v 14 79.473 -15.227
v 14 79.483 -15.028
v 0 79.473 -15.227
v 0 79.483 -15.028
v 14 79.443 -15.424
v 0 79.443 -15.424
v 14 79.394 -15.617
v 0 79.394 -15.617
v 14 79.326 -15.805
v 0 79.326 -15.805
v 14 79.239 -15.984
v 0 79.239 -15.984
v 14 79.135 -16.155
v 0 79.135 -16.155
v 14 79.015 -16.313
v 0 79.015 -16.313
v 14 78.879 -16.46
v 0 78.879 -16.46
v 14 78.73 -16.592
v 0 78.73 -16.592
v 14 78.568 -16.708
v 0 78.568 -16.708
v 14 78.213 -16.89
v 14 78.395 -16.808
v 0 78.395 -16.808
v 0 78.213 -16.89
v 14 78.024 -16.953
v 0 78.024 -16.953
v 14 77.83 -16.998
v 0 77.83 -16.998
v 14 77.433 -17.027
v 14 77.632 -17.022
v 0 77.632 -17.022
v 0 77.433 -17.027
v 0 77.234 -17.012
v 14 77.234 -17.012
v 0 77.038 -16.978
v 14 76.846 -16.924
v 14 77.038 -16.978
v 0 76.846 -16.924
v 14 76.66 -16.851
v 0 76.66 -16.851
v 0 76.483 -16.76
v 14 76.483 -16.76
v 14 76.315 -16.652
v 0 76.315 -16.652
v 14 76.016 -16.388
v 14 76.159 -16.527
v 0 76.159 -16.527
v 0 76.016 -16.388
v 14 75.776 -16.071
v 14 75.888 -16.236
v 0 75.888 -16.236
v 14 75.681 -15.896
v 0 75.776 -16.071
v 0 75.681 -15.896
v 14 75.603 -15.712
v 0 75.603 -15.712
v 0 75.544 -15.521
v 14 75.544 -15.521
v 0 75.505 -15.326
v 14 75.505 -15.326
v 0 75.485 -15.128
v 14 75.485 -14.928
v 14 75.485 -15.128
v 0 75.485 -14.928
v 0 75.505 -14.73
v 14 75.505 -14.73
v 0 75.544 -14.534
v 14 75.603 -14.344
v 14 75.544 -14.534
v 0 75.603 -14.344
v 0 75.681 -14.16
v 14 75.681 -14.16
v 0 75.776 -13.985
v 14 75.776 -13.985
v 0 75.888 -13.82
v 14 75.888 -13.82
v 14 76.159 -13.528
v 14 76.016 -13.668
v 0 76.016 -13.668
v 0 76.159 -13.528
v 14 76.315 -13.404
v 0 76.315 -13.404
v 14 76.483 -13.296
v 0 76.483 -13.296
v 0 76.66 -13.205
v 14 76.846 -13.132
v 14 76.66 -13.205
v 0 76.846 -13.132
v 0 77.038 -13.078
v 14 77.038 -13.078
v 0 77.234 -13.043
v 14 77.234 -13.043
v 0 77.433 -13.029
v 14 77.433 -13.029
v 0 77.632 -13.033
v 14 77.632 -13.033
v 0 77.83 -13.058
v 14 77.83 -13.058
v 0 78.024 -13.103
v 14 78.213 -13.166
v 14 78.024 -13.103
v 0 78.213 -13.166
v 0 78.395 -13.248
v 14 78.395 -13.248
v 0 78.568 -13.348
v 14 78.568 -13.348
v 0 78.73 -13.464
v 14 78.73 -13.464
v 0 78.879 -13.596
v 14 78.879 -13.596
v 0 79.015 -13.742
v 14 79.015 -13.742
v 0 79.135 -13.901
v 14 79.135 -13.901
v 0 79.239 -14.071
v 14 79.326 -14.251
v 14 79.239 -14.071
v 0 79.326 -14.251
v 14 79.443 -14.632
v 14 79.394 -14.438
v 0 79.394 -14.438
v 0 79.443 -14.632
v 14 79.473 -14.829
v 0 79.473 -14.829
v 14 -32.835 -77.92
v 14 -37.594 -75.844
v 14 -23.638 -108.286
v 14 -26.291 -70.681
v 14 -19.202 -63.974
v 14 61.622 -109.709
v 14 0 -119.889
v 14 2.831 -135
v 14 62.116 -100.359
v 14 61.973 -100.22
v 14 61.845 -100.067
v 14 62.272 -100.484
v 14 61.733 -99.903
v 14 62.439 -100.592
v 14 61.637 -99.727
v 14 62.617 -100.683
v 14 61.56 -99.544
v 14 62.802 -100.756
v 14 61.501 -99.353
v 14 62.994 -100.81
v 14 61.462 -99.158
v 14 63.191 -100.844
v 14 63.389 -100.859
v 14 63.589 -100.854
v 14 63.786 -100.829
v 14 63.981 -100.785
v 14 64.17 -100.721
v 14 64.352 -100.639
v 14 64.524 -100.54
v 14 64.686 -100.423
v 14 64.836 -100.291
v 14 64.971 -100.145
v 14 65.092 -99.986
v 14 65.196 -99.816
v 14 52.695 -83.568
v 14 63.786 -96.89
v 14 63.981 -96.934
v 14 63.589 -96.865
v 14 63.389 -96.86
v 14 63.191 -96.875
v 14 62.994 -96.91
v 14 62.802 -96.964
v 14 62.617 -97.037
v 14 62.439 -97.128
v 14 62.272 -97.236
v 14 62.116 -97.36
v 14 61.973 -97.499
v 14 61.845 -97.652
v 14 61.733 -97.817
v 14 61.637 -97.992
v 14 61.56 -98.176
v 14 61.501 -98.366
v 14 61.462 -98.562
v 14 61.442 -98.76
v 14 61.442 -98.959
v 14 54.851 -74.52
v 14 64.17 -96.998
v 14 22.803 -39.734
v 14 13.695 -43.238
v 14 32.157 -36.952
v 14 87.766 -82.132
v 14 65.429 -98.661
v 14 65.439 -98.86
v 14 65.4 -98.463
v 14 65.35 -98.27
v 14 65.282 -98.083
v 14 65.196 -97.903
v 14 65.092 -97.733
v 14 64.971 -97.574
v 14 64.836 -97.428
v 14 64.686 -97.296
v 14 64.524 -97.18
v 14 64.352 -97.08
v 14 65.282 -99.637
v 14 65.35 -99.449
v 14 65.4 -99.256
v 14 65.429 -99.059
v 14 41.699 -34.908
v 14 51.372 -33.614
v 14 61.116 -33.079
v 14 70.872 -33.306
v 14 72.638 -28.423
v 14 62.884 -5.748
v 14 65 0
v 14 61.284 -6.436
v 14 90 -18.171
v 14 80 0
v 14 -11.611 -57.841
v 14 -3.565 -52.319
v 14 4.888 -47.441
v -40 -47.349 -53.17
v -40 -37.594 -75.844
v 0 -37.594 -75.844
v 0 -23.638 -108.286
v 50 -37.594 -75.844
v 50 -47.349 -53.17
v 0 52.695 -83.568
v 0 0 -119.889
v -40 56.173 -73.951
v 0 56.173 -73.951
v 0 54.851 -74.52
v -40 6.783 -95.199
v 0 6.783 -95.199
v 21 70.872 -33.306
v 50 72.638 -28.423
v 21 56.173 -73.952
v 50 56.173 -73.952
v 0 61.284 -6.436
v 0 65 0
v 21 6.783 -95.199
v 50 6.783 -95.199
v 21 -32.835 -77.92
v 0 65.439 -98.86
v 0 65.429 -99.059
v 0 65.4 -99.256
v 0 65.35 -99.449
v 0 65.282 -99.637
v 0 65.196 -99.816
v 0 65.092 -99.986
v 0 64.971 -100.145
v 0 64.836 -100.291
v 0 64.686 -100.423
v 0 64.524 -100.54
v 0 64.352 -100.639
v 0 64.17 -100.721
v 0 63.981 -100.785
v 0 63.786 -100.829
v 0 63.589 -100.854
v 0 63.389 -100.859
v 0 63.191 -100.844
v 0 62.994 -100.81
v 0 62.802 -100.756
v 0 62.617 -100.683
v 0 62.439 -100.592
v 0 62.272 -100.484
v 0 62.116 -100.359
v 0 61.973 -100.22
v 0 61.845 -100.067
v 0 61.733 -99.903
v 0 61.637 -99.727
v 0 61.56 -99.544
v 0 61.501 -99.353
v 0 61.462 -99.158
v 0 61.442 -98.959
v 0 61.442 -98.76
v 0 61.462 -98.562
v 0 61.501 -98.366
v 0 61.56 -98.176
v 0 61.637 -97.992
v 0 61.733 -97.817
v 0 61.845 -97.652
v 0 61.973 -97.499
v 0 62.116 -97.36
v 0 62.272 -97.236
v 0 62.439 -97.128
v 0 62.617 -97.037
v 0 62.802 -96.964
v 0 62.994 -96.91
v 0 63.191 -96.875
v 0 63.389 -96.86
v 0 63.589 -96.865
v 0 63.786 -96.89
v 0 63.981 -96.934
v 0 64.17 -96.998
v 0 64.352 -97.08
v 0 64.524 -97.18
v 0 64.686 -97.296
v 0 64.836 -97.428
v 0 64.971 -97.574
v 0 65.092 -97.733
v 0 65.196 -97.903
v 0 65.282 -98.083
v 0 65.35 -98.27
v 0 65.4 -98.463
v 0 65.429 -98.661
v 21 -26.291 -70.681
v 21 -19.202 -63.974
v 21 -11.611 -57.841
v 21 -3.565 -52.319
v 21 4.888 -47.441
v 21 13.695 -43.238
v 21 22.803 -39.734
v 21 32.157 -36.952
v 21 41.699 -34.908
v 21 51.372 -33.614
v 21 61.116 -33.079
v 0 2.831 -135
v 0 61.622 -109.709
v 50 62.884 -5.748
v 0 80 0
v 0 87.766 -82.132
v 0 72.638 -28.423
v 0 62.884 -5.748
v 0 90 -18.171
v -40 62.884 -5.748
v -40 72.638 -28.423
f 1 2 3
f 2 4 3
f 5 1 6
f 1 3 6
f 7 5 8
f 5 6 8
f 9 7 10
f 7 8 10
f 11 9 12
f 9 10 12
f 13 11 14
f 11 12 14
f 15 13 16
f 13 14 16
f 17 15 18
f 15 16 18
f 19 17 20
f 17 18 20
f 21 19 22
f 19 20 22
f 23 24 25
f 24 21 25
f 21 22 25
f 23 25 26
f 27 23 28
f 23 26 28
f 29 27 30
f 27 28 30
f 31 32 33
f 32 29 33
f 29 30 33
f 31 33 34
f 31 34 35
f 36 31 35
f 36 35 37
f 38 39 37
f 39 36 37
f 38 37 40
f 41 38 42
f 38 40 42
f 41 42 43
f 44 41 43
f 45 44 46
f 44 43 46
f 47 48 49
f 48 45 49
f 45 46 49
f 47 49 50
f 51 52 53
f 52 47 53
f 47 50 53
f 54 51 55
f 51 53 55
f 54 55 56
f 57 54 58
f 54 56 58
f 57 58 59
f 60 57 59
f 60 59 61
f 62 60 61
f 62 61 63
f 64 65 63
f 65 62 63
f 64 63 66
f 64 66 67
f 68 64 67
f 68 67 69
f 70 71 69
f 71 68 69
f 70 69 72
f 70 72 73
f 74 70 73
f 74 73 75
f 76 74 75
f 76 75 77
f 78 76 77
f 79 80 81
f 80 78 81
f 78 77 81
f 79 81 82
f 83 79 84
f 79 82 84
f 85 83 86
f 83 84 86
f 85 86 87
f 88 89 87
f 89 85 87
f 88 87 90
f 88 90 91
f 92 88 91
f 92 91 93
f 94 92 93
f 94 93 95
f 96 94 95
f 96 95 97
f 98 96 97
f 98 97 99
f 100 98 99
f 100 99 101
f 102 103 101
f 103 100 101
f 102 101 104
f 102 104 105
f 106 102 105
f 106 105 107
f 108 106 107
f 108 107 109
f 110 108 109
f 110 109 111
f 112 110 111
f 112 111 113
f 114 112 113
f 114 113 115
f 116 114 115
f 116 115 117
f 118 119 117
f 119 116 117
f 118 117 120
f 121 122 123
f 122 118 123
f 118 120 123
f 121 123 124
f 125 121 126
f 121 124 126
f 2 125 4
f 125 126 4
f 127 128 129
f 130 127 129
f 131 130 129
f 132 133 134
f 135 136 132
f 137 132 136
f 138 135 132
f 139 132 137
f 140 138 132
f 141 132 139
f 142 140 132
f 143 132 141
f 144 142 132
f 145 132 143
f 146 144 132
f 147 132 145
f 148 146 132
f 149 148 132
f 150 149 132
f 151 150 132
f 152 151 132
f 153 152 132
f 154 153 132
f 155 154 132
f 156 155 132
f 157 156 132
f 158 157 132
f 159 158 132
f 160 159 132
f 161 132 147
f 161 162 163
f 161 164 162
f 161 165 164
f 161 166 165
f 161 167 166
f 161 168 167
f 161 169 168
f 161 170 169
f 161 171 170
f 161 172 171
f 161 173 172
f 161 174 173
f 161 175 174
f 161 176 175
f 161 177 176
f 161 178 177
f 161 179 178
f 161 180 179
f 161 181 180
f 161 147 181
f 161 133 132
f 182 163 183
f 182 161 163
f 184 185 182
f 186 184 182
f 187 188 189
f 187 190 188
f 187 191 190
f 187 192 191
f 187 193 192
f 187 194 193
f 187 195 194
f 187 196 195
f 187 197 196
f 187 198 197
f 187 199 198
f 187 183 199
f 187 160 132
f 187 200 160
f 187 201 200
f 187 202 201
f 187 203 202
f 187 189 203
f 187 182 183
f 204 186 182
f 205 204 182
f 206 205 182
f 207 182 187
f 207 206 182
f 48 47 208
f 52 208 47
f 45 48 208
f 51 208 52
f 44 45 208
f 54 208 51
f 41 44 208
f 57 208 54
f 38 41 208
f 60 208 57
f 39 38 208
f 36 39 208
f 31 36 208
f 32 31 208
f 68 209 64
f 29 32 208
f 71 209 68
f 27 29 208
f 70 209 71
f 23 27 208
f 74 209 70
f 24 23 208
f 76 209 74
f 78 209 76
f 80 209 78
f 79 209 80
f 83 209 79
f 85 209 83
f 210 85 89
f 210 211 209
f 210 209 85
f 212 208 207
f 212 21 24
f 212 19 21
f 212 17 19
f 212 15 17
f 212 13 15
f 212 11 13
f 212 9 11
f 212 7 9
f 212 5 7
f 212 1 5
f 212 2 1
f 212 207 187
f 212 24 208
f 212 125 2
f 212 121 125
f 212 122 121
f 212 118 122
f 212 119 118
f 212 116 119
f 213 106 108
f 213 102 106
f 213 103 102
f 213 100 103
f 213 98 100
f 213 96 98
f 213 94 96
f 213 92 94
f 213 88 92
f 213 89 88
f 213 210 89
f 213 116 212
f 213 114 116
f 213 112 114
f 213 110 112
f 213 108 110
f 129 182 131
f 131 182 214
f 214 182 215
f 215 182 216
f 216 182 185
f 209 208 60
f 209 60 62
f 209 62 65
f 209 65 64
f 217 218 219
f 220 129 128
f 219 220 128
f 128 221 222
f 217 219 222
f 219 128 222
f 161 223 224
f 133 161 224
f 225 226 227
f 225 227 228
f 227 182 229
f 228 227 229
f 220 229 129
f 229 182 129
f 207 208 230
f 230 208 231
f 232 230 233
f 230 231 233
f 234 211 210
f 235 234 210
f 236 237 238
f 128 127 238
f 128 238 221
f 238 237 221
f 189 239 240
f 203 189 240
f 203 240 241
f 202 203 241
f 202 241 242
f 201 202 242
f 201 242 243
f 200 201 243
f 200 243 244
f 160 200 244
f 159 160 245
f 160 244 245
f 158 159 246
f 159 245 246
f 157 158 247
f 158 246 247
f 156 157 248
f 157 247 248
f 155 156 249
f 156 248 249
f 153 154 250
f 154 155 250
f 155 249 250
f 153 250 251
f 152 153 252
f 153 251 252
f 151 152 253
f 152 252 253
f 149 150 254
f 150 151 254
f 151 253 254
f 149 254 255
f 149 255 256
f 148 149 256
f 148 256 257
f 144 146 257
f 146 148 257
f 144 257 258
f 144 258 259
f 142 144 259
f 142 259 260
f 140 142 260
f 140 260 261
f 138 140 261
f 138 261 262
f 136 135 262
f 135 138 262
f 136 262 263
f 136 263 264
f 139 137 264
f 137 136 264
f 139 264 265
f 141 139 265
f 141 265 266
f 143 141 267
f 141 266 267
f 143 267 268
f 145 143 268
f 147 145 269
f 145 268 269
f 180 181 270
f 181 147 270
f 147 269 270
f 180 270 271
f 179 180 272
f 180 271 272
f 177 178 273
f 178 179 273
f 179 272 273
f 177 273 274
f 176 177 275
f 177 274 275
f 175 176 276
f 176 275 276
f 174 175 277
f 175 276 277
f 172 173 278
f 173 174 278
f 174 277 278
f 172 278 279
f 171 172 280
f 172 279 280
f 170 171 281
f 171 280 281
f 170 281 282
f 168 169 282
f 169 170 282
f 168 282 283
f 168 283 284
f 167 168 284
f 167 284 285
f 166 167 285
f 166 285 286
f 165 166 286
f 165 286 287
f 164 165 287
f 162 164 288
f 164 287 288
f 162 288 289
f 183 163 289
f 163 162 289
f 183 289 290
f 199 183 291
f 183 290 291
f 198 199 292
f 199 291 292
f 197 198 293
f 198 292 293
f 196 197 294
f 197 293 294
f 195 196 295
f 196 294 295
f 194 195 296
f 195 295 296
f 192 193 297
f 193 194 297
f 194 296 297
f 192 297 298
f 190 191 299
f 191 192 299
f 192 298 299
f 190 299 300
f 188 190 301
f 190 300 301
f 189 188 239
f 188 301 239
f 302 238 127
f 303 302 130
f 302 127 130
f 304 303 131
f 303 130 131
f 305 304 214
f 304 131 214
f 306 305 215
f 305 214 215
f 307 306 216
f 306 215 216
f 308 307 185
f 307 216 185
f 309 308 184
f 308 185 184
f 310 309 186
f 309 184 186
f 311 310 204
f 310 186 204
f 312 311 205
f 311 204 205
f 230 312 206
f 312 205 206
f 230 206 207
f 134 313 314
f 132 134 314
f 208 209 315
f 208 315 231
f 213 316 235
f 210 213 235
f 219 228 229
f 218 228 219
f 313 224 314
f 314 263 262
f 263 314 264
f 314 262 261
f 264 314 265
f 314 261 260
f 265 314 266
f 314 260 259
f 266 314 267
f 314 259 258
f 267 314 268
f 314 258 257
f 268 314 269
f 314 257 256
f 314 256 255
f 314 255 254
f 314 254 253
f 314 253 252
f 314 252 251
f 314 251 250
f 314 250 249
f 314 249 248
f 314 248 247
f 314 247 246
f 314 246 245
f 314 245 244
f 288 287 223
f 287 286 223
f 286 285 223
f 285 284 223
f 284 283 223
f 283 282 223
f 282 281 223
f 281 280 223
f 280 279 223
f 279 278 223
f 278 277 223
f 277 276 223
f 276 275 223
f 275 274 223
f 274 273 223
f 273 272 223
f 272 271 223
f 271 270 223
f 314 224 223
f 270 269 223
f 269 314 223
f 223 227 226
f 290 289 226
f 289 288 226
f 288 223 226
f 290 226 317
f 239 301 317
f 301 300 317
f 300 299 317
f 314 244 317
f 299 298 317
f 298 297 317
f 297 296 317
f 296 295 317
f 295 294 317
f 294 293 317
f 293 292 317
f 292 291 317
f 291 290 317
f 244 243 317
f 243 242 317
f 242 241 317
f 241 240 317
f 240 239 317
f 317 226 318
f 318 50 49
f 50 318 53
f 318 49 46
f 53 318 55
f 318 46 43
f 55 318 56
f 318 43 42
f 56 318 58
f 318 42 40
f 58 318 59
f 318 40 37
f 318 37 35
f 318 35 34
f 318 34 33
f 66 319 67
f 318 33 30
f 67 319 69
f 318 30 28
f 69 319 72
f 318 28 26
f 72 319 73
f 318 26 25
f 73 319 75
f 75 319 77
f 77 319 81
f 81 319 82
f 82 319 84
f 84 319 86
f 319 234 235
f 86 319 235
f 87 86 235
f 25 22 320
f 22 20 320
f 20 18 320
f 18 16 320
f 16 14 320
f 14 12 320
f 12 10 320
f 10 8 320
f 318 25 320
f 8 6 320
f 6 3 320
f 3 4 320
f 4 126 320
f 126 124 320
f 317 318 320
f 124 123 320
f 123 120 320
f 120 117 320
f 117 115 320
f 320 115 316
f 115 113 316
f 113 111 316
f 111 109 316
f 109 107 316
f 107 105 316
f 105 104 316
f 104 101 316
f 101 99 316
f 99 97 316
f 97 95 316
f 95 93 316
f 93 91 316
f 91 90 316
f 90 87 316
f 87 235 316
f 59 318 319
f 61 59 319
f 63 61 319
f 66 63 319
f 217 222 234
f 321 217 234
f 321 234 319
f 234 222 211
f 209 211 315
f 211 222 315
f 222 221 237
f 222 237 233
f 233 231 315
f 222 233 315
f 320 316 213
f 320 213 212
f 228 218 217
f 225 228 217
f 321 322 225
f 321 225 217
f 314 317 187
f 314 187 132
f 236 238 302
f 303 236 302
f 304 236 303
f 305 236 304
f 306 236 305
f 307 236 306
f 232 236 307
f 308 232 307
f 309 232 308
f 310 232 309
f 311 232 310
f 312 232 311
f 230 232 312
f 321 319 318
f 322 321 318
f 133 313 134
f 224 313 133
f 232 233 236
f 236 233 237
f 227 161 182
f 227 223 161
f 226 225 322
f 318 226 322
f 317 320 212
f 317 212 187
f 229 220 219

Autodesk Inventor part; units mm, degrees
ref_plane "YZ Plane" through (0, 0, 0) normal (1, 0, 0) x (0, 1, 0)
ref_plane "XZ Plane" through (0, 0, 0) normal (0, 1, 0) x (-1, 0, 0)
ref_plane "XY Plane" through (0, 0, 0) normal (0, 0, 1) x (1, 0, 0)
sketch "Sketch1" plane through (0, 0, 0) normal (1, 0, 0) x (0, 1, 0)
  line L0 (90, 0) -> (0, 0) construction
  line L1 (0, 0) -> (0, -135) construction
  line L2 (0, -135) -> (90, -135) construction
  line L3 (90, -135) -> (90, 0) construction
  line L4 (80, 0) -> (65, 0)
  line L5 (80, 0) -> (90, -18.1711)
  line L6 (90, -18.1711) -> (87.7664, -82.1322)
  line L7 (87.7664, -82.1322) -> (61.6218, -109.7086)
  line L8 (2.8311, -135) -> (0, -119.8888)
  line L9 (52.695, -83.5675) -> (60.7393, -49.8037)
  line L10 (60.7393, -49.8037) -> (55.0089, -17.3051)
  line L11 (55.0089, -17.3051) -> (65, 0)
  line L12 (55.0089, -17.3051) -> (52.695, -83.5675) construction
  line L13 (52.695, -83.5675) -> (0, -119.8888)
  line L14 (2.8311, -135) -> (61.6218, -109.7086)
  line L15 (87.7664, -82.1322) -> (0, -119.8888) construction
  line L16 (80, 0) -> (61.6218, -109.7086) construction
  line L17 (0, 27) -> (0, -162) projected
  line L18 (-18, 0) -> (108, 0) projected
  circle A0 centre (77.4826, -15.0279) radius 2
  circle A1 centre (63.4392, -98.8597) radius 2
  line L19 (61.6218, -109.7086) -> (23.93, -103.3945) construction
  dimension "d10" = 135
  dimension "d11" = 90
  dimension "d29" = 10
  dimension "d30" = 15
  dimension "d31" = 2
  dimension "d34" = 120
  dimension "d37" = 64
  dimension "d39" = 35
  dimension "d40" = 140
  dimension "d42" = 38
  dimension "d43" = 15
  dimension "d44" = 64
  dimension "d45" = 64
  dimension "d46" = 33
  dimension "d47" = 34.7088
  dimension "d59" = 85
  dimension "d60" = 11
  dimension "d61" = 4
extrude "Extrusion1" add sketch "Sketch1" along normal blind 14 contours L5 L6 L7 L14 L8 L13 L9 L10 L11 L4
sketch "Sketch2" plane through (0, 0, 0) normal (-1, 0, 0) x (0, 0, 1)
  line L0 (-18.1711, 90) -> (0, 80) projected
  line L1 (-82.1322, 87.7664) -> (-18.1711, 90) projected
  line L2 (-109.7086, 61.6218) -> (-82.1322, 87.7664) projected
  line L3 (-135, 2.8311) -> (-109.7086, 61.6218) projected
  line L4 (-119.8888, 0) -> (-135, 2.8311) projected
  line L5 (-83.5675, 52.695) -> (-119.8888, 0) projected
  line L6 (-49.8037, 60.7393) -> (-83.5675, 52.695) projected
  line L7 (-17.3051, 55.0089) -> (-49.8037, 60.7393) projected
  line L8 (0, 65) -> (-17.3051, 55.0089) projected
  line L9 (0, 80) -> (0, 65) projected
  circle A0 centre (-98.8597, 63.4392) radius 2 projected
  circle A1 centre (-15.0279, 77.4826) radius 2 projected
  line L10 (-135, 2.8311) -> (-109.7086, 61.6218) projected
  line L11 (-18.1711, 90) -> (0, 80) projected
  line L12 (-5.748, 62.8835) -> (-60.8643, 86.5942)
  line L13 (-60.8643, 86.5942) -> (-108.2857, -23.6383)
  line L14 (-108.2857, -23.6383) -> (-53.1695, -47.349)
  line L15 (-53.1695, -47.349) -> (-5.748, 62.8835)
  line L16 (-18.1711, 90) -> (-27.3572, 93.9518)
  point P0 (-74.5203, 54.8505)
  point P1 (-6.436, 61.2841)
  dimension "d70" = 35
  dimension "d72" = 120
  dimension "d76" = 60
  dimension "d78" = 10
  dimension "d79" = 20
extrude "Extrusion2" add sketch "Sketch2" along normal blind 40 and the other way blind 50 contours L15 L14 L13 L6 L7 L8 | L8 L7 L6 L13 L12 L15
sketch "Sketch3" plane through (-40, 0, 0) normal (-1, 0, 0) x (0, 0, 1)
  circle A0 centre (-15.0279, 77.4826) radius 2 projected
  line L0 (-83.5675, 52.695) -> (-15.0279, 77.4826)
  line L1 (-5.748, 62.8835) -> (-60.8643, 86.5942) projected
  line L2 (-60.8643, 86.5942) -> (-108.2857, -23.6383) projected
  line L3 (-5.748, 62.8835) -> (-53.1695, -47.349) projected
  line L4 (-29.4587, 7.7672) -> (-84.575, 31.4779) construction
  line L5 (-99.2863, 16.1562) -> (-70.1502, -50.6509)
  line L6 (-108.2857, -23.6383) -> (-53.1695, -47.349) projected
  point P0 (0, 0)
  point P1 (-73.9515, 56.1726)
  point P2 (-28.423, 72.6381)
  point P3 (-75.8445, -37.5944)
  point P4 (-95.1985, 6.7833)
extrude "Extrusion3" cut sketch "Sketch3" against normal up to surface (40 mm away) contours L0 L2 L1 | L5 L6 L2
sketch "Sketch4" plane through (50, 0, 0) normal (1, 0, 0) x (0, 0, -1)
  line L0 (5.748, 62.8835) -> (60.8643, 86.5942) projected
  line L1 (60.8643, 86.5942) -> (108.2857, -23.6383) projected
  line L2 (28.423, 72.6381) -> (73.9515, 56.1726) projected
  line L3 (99.2863, 16.1562) -> (70.1502, -50.6509) projected
  line L4 (108.2857, -23.6383) -> (53.1695, -47.349) projected
  point P0 (0, 0)
  point P1 (75.8445, -37.5944)
  point P2 (95.1985, 6.7833)
extrude "Extrusion4" cut sketch "Sketch4" against normal up to surface (36 mm away)
sketch "Sketch5" plane through (14, 0, 0) normal (-1, 0, 0) x (0, 0, 1)
  circle A0 centre (-158.0633, 63.0922) radius 125
  line L0 (-29.4587, 7.7672) -> (-84.575, 31.4779) construction
  line L1 (-84.575, 31.4779) -> (-158.0633, 63.0922)
  point P0 (0, 0)
  dimension "d88" = 80
  dimension "d89" = 250
extrude "Extrusion5" cut sketch "Sketch5" against normal blind 7
equation "\"d61\" = Mount_Hole_Diameter"
equation "\"Mount_Hole_Diameter\" = 4"
properties part number "F3 Front Caliper Bracket"
